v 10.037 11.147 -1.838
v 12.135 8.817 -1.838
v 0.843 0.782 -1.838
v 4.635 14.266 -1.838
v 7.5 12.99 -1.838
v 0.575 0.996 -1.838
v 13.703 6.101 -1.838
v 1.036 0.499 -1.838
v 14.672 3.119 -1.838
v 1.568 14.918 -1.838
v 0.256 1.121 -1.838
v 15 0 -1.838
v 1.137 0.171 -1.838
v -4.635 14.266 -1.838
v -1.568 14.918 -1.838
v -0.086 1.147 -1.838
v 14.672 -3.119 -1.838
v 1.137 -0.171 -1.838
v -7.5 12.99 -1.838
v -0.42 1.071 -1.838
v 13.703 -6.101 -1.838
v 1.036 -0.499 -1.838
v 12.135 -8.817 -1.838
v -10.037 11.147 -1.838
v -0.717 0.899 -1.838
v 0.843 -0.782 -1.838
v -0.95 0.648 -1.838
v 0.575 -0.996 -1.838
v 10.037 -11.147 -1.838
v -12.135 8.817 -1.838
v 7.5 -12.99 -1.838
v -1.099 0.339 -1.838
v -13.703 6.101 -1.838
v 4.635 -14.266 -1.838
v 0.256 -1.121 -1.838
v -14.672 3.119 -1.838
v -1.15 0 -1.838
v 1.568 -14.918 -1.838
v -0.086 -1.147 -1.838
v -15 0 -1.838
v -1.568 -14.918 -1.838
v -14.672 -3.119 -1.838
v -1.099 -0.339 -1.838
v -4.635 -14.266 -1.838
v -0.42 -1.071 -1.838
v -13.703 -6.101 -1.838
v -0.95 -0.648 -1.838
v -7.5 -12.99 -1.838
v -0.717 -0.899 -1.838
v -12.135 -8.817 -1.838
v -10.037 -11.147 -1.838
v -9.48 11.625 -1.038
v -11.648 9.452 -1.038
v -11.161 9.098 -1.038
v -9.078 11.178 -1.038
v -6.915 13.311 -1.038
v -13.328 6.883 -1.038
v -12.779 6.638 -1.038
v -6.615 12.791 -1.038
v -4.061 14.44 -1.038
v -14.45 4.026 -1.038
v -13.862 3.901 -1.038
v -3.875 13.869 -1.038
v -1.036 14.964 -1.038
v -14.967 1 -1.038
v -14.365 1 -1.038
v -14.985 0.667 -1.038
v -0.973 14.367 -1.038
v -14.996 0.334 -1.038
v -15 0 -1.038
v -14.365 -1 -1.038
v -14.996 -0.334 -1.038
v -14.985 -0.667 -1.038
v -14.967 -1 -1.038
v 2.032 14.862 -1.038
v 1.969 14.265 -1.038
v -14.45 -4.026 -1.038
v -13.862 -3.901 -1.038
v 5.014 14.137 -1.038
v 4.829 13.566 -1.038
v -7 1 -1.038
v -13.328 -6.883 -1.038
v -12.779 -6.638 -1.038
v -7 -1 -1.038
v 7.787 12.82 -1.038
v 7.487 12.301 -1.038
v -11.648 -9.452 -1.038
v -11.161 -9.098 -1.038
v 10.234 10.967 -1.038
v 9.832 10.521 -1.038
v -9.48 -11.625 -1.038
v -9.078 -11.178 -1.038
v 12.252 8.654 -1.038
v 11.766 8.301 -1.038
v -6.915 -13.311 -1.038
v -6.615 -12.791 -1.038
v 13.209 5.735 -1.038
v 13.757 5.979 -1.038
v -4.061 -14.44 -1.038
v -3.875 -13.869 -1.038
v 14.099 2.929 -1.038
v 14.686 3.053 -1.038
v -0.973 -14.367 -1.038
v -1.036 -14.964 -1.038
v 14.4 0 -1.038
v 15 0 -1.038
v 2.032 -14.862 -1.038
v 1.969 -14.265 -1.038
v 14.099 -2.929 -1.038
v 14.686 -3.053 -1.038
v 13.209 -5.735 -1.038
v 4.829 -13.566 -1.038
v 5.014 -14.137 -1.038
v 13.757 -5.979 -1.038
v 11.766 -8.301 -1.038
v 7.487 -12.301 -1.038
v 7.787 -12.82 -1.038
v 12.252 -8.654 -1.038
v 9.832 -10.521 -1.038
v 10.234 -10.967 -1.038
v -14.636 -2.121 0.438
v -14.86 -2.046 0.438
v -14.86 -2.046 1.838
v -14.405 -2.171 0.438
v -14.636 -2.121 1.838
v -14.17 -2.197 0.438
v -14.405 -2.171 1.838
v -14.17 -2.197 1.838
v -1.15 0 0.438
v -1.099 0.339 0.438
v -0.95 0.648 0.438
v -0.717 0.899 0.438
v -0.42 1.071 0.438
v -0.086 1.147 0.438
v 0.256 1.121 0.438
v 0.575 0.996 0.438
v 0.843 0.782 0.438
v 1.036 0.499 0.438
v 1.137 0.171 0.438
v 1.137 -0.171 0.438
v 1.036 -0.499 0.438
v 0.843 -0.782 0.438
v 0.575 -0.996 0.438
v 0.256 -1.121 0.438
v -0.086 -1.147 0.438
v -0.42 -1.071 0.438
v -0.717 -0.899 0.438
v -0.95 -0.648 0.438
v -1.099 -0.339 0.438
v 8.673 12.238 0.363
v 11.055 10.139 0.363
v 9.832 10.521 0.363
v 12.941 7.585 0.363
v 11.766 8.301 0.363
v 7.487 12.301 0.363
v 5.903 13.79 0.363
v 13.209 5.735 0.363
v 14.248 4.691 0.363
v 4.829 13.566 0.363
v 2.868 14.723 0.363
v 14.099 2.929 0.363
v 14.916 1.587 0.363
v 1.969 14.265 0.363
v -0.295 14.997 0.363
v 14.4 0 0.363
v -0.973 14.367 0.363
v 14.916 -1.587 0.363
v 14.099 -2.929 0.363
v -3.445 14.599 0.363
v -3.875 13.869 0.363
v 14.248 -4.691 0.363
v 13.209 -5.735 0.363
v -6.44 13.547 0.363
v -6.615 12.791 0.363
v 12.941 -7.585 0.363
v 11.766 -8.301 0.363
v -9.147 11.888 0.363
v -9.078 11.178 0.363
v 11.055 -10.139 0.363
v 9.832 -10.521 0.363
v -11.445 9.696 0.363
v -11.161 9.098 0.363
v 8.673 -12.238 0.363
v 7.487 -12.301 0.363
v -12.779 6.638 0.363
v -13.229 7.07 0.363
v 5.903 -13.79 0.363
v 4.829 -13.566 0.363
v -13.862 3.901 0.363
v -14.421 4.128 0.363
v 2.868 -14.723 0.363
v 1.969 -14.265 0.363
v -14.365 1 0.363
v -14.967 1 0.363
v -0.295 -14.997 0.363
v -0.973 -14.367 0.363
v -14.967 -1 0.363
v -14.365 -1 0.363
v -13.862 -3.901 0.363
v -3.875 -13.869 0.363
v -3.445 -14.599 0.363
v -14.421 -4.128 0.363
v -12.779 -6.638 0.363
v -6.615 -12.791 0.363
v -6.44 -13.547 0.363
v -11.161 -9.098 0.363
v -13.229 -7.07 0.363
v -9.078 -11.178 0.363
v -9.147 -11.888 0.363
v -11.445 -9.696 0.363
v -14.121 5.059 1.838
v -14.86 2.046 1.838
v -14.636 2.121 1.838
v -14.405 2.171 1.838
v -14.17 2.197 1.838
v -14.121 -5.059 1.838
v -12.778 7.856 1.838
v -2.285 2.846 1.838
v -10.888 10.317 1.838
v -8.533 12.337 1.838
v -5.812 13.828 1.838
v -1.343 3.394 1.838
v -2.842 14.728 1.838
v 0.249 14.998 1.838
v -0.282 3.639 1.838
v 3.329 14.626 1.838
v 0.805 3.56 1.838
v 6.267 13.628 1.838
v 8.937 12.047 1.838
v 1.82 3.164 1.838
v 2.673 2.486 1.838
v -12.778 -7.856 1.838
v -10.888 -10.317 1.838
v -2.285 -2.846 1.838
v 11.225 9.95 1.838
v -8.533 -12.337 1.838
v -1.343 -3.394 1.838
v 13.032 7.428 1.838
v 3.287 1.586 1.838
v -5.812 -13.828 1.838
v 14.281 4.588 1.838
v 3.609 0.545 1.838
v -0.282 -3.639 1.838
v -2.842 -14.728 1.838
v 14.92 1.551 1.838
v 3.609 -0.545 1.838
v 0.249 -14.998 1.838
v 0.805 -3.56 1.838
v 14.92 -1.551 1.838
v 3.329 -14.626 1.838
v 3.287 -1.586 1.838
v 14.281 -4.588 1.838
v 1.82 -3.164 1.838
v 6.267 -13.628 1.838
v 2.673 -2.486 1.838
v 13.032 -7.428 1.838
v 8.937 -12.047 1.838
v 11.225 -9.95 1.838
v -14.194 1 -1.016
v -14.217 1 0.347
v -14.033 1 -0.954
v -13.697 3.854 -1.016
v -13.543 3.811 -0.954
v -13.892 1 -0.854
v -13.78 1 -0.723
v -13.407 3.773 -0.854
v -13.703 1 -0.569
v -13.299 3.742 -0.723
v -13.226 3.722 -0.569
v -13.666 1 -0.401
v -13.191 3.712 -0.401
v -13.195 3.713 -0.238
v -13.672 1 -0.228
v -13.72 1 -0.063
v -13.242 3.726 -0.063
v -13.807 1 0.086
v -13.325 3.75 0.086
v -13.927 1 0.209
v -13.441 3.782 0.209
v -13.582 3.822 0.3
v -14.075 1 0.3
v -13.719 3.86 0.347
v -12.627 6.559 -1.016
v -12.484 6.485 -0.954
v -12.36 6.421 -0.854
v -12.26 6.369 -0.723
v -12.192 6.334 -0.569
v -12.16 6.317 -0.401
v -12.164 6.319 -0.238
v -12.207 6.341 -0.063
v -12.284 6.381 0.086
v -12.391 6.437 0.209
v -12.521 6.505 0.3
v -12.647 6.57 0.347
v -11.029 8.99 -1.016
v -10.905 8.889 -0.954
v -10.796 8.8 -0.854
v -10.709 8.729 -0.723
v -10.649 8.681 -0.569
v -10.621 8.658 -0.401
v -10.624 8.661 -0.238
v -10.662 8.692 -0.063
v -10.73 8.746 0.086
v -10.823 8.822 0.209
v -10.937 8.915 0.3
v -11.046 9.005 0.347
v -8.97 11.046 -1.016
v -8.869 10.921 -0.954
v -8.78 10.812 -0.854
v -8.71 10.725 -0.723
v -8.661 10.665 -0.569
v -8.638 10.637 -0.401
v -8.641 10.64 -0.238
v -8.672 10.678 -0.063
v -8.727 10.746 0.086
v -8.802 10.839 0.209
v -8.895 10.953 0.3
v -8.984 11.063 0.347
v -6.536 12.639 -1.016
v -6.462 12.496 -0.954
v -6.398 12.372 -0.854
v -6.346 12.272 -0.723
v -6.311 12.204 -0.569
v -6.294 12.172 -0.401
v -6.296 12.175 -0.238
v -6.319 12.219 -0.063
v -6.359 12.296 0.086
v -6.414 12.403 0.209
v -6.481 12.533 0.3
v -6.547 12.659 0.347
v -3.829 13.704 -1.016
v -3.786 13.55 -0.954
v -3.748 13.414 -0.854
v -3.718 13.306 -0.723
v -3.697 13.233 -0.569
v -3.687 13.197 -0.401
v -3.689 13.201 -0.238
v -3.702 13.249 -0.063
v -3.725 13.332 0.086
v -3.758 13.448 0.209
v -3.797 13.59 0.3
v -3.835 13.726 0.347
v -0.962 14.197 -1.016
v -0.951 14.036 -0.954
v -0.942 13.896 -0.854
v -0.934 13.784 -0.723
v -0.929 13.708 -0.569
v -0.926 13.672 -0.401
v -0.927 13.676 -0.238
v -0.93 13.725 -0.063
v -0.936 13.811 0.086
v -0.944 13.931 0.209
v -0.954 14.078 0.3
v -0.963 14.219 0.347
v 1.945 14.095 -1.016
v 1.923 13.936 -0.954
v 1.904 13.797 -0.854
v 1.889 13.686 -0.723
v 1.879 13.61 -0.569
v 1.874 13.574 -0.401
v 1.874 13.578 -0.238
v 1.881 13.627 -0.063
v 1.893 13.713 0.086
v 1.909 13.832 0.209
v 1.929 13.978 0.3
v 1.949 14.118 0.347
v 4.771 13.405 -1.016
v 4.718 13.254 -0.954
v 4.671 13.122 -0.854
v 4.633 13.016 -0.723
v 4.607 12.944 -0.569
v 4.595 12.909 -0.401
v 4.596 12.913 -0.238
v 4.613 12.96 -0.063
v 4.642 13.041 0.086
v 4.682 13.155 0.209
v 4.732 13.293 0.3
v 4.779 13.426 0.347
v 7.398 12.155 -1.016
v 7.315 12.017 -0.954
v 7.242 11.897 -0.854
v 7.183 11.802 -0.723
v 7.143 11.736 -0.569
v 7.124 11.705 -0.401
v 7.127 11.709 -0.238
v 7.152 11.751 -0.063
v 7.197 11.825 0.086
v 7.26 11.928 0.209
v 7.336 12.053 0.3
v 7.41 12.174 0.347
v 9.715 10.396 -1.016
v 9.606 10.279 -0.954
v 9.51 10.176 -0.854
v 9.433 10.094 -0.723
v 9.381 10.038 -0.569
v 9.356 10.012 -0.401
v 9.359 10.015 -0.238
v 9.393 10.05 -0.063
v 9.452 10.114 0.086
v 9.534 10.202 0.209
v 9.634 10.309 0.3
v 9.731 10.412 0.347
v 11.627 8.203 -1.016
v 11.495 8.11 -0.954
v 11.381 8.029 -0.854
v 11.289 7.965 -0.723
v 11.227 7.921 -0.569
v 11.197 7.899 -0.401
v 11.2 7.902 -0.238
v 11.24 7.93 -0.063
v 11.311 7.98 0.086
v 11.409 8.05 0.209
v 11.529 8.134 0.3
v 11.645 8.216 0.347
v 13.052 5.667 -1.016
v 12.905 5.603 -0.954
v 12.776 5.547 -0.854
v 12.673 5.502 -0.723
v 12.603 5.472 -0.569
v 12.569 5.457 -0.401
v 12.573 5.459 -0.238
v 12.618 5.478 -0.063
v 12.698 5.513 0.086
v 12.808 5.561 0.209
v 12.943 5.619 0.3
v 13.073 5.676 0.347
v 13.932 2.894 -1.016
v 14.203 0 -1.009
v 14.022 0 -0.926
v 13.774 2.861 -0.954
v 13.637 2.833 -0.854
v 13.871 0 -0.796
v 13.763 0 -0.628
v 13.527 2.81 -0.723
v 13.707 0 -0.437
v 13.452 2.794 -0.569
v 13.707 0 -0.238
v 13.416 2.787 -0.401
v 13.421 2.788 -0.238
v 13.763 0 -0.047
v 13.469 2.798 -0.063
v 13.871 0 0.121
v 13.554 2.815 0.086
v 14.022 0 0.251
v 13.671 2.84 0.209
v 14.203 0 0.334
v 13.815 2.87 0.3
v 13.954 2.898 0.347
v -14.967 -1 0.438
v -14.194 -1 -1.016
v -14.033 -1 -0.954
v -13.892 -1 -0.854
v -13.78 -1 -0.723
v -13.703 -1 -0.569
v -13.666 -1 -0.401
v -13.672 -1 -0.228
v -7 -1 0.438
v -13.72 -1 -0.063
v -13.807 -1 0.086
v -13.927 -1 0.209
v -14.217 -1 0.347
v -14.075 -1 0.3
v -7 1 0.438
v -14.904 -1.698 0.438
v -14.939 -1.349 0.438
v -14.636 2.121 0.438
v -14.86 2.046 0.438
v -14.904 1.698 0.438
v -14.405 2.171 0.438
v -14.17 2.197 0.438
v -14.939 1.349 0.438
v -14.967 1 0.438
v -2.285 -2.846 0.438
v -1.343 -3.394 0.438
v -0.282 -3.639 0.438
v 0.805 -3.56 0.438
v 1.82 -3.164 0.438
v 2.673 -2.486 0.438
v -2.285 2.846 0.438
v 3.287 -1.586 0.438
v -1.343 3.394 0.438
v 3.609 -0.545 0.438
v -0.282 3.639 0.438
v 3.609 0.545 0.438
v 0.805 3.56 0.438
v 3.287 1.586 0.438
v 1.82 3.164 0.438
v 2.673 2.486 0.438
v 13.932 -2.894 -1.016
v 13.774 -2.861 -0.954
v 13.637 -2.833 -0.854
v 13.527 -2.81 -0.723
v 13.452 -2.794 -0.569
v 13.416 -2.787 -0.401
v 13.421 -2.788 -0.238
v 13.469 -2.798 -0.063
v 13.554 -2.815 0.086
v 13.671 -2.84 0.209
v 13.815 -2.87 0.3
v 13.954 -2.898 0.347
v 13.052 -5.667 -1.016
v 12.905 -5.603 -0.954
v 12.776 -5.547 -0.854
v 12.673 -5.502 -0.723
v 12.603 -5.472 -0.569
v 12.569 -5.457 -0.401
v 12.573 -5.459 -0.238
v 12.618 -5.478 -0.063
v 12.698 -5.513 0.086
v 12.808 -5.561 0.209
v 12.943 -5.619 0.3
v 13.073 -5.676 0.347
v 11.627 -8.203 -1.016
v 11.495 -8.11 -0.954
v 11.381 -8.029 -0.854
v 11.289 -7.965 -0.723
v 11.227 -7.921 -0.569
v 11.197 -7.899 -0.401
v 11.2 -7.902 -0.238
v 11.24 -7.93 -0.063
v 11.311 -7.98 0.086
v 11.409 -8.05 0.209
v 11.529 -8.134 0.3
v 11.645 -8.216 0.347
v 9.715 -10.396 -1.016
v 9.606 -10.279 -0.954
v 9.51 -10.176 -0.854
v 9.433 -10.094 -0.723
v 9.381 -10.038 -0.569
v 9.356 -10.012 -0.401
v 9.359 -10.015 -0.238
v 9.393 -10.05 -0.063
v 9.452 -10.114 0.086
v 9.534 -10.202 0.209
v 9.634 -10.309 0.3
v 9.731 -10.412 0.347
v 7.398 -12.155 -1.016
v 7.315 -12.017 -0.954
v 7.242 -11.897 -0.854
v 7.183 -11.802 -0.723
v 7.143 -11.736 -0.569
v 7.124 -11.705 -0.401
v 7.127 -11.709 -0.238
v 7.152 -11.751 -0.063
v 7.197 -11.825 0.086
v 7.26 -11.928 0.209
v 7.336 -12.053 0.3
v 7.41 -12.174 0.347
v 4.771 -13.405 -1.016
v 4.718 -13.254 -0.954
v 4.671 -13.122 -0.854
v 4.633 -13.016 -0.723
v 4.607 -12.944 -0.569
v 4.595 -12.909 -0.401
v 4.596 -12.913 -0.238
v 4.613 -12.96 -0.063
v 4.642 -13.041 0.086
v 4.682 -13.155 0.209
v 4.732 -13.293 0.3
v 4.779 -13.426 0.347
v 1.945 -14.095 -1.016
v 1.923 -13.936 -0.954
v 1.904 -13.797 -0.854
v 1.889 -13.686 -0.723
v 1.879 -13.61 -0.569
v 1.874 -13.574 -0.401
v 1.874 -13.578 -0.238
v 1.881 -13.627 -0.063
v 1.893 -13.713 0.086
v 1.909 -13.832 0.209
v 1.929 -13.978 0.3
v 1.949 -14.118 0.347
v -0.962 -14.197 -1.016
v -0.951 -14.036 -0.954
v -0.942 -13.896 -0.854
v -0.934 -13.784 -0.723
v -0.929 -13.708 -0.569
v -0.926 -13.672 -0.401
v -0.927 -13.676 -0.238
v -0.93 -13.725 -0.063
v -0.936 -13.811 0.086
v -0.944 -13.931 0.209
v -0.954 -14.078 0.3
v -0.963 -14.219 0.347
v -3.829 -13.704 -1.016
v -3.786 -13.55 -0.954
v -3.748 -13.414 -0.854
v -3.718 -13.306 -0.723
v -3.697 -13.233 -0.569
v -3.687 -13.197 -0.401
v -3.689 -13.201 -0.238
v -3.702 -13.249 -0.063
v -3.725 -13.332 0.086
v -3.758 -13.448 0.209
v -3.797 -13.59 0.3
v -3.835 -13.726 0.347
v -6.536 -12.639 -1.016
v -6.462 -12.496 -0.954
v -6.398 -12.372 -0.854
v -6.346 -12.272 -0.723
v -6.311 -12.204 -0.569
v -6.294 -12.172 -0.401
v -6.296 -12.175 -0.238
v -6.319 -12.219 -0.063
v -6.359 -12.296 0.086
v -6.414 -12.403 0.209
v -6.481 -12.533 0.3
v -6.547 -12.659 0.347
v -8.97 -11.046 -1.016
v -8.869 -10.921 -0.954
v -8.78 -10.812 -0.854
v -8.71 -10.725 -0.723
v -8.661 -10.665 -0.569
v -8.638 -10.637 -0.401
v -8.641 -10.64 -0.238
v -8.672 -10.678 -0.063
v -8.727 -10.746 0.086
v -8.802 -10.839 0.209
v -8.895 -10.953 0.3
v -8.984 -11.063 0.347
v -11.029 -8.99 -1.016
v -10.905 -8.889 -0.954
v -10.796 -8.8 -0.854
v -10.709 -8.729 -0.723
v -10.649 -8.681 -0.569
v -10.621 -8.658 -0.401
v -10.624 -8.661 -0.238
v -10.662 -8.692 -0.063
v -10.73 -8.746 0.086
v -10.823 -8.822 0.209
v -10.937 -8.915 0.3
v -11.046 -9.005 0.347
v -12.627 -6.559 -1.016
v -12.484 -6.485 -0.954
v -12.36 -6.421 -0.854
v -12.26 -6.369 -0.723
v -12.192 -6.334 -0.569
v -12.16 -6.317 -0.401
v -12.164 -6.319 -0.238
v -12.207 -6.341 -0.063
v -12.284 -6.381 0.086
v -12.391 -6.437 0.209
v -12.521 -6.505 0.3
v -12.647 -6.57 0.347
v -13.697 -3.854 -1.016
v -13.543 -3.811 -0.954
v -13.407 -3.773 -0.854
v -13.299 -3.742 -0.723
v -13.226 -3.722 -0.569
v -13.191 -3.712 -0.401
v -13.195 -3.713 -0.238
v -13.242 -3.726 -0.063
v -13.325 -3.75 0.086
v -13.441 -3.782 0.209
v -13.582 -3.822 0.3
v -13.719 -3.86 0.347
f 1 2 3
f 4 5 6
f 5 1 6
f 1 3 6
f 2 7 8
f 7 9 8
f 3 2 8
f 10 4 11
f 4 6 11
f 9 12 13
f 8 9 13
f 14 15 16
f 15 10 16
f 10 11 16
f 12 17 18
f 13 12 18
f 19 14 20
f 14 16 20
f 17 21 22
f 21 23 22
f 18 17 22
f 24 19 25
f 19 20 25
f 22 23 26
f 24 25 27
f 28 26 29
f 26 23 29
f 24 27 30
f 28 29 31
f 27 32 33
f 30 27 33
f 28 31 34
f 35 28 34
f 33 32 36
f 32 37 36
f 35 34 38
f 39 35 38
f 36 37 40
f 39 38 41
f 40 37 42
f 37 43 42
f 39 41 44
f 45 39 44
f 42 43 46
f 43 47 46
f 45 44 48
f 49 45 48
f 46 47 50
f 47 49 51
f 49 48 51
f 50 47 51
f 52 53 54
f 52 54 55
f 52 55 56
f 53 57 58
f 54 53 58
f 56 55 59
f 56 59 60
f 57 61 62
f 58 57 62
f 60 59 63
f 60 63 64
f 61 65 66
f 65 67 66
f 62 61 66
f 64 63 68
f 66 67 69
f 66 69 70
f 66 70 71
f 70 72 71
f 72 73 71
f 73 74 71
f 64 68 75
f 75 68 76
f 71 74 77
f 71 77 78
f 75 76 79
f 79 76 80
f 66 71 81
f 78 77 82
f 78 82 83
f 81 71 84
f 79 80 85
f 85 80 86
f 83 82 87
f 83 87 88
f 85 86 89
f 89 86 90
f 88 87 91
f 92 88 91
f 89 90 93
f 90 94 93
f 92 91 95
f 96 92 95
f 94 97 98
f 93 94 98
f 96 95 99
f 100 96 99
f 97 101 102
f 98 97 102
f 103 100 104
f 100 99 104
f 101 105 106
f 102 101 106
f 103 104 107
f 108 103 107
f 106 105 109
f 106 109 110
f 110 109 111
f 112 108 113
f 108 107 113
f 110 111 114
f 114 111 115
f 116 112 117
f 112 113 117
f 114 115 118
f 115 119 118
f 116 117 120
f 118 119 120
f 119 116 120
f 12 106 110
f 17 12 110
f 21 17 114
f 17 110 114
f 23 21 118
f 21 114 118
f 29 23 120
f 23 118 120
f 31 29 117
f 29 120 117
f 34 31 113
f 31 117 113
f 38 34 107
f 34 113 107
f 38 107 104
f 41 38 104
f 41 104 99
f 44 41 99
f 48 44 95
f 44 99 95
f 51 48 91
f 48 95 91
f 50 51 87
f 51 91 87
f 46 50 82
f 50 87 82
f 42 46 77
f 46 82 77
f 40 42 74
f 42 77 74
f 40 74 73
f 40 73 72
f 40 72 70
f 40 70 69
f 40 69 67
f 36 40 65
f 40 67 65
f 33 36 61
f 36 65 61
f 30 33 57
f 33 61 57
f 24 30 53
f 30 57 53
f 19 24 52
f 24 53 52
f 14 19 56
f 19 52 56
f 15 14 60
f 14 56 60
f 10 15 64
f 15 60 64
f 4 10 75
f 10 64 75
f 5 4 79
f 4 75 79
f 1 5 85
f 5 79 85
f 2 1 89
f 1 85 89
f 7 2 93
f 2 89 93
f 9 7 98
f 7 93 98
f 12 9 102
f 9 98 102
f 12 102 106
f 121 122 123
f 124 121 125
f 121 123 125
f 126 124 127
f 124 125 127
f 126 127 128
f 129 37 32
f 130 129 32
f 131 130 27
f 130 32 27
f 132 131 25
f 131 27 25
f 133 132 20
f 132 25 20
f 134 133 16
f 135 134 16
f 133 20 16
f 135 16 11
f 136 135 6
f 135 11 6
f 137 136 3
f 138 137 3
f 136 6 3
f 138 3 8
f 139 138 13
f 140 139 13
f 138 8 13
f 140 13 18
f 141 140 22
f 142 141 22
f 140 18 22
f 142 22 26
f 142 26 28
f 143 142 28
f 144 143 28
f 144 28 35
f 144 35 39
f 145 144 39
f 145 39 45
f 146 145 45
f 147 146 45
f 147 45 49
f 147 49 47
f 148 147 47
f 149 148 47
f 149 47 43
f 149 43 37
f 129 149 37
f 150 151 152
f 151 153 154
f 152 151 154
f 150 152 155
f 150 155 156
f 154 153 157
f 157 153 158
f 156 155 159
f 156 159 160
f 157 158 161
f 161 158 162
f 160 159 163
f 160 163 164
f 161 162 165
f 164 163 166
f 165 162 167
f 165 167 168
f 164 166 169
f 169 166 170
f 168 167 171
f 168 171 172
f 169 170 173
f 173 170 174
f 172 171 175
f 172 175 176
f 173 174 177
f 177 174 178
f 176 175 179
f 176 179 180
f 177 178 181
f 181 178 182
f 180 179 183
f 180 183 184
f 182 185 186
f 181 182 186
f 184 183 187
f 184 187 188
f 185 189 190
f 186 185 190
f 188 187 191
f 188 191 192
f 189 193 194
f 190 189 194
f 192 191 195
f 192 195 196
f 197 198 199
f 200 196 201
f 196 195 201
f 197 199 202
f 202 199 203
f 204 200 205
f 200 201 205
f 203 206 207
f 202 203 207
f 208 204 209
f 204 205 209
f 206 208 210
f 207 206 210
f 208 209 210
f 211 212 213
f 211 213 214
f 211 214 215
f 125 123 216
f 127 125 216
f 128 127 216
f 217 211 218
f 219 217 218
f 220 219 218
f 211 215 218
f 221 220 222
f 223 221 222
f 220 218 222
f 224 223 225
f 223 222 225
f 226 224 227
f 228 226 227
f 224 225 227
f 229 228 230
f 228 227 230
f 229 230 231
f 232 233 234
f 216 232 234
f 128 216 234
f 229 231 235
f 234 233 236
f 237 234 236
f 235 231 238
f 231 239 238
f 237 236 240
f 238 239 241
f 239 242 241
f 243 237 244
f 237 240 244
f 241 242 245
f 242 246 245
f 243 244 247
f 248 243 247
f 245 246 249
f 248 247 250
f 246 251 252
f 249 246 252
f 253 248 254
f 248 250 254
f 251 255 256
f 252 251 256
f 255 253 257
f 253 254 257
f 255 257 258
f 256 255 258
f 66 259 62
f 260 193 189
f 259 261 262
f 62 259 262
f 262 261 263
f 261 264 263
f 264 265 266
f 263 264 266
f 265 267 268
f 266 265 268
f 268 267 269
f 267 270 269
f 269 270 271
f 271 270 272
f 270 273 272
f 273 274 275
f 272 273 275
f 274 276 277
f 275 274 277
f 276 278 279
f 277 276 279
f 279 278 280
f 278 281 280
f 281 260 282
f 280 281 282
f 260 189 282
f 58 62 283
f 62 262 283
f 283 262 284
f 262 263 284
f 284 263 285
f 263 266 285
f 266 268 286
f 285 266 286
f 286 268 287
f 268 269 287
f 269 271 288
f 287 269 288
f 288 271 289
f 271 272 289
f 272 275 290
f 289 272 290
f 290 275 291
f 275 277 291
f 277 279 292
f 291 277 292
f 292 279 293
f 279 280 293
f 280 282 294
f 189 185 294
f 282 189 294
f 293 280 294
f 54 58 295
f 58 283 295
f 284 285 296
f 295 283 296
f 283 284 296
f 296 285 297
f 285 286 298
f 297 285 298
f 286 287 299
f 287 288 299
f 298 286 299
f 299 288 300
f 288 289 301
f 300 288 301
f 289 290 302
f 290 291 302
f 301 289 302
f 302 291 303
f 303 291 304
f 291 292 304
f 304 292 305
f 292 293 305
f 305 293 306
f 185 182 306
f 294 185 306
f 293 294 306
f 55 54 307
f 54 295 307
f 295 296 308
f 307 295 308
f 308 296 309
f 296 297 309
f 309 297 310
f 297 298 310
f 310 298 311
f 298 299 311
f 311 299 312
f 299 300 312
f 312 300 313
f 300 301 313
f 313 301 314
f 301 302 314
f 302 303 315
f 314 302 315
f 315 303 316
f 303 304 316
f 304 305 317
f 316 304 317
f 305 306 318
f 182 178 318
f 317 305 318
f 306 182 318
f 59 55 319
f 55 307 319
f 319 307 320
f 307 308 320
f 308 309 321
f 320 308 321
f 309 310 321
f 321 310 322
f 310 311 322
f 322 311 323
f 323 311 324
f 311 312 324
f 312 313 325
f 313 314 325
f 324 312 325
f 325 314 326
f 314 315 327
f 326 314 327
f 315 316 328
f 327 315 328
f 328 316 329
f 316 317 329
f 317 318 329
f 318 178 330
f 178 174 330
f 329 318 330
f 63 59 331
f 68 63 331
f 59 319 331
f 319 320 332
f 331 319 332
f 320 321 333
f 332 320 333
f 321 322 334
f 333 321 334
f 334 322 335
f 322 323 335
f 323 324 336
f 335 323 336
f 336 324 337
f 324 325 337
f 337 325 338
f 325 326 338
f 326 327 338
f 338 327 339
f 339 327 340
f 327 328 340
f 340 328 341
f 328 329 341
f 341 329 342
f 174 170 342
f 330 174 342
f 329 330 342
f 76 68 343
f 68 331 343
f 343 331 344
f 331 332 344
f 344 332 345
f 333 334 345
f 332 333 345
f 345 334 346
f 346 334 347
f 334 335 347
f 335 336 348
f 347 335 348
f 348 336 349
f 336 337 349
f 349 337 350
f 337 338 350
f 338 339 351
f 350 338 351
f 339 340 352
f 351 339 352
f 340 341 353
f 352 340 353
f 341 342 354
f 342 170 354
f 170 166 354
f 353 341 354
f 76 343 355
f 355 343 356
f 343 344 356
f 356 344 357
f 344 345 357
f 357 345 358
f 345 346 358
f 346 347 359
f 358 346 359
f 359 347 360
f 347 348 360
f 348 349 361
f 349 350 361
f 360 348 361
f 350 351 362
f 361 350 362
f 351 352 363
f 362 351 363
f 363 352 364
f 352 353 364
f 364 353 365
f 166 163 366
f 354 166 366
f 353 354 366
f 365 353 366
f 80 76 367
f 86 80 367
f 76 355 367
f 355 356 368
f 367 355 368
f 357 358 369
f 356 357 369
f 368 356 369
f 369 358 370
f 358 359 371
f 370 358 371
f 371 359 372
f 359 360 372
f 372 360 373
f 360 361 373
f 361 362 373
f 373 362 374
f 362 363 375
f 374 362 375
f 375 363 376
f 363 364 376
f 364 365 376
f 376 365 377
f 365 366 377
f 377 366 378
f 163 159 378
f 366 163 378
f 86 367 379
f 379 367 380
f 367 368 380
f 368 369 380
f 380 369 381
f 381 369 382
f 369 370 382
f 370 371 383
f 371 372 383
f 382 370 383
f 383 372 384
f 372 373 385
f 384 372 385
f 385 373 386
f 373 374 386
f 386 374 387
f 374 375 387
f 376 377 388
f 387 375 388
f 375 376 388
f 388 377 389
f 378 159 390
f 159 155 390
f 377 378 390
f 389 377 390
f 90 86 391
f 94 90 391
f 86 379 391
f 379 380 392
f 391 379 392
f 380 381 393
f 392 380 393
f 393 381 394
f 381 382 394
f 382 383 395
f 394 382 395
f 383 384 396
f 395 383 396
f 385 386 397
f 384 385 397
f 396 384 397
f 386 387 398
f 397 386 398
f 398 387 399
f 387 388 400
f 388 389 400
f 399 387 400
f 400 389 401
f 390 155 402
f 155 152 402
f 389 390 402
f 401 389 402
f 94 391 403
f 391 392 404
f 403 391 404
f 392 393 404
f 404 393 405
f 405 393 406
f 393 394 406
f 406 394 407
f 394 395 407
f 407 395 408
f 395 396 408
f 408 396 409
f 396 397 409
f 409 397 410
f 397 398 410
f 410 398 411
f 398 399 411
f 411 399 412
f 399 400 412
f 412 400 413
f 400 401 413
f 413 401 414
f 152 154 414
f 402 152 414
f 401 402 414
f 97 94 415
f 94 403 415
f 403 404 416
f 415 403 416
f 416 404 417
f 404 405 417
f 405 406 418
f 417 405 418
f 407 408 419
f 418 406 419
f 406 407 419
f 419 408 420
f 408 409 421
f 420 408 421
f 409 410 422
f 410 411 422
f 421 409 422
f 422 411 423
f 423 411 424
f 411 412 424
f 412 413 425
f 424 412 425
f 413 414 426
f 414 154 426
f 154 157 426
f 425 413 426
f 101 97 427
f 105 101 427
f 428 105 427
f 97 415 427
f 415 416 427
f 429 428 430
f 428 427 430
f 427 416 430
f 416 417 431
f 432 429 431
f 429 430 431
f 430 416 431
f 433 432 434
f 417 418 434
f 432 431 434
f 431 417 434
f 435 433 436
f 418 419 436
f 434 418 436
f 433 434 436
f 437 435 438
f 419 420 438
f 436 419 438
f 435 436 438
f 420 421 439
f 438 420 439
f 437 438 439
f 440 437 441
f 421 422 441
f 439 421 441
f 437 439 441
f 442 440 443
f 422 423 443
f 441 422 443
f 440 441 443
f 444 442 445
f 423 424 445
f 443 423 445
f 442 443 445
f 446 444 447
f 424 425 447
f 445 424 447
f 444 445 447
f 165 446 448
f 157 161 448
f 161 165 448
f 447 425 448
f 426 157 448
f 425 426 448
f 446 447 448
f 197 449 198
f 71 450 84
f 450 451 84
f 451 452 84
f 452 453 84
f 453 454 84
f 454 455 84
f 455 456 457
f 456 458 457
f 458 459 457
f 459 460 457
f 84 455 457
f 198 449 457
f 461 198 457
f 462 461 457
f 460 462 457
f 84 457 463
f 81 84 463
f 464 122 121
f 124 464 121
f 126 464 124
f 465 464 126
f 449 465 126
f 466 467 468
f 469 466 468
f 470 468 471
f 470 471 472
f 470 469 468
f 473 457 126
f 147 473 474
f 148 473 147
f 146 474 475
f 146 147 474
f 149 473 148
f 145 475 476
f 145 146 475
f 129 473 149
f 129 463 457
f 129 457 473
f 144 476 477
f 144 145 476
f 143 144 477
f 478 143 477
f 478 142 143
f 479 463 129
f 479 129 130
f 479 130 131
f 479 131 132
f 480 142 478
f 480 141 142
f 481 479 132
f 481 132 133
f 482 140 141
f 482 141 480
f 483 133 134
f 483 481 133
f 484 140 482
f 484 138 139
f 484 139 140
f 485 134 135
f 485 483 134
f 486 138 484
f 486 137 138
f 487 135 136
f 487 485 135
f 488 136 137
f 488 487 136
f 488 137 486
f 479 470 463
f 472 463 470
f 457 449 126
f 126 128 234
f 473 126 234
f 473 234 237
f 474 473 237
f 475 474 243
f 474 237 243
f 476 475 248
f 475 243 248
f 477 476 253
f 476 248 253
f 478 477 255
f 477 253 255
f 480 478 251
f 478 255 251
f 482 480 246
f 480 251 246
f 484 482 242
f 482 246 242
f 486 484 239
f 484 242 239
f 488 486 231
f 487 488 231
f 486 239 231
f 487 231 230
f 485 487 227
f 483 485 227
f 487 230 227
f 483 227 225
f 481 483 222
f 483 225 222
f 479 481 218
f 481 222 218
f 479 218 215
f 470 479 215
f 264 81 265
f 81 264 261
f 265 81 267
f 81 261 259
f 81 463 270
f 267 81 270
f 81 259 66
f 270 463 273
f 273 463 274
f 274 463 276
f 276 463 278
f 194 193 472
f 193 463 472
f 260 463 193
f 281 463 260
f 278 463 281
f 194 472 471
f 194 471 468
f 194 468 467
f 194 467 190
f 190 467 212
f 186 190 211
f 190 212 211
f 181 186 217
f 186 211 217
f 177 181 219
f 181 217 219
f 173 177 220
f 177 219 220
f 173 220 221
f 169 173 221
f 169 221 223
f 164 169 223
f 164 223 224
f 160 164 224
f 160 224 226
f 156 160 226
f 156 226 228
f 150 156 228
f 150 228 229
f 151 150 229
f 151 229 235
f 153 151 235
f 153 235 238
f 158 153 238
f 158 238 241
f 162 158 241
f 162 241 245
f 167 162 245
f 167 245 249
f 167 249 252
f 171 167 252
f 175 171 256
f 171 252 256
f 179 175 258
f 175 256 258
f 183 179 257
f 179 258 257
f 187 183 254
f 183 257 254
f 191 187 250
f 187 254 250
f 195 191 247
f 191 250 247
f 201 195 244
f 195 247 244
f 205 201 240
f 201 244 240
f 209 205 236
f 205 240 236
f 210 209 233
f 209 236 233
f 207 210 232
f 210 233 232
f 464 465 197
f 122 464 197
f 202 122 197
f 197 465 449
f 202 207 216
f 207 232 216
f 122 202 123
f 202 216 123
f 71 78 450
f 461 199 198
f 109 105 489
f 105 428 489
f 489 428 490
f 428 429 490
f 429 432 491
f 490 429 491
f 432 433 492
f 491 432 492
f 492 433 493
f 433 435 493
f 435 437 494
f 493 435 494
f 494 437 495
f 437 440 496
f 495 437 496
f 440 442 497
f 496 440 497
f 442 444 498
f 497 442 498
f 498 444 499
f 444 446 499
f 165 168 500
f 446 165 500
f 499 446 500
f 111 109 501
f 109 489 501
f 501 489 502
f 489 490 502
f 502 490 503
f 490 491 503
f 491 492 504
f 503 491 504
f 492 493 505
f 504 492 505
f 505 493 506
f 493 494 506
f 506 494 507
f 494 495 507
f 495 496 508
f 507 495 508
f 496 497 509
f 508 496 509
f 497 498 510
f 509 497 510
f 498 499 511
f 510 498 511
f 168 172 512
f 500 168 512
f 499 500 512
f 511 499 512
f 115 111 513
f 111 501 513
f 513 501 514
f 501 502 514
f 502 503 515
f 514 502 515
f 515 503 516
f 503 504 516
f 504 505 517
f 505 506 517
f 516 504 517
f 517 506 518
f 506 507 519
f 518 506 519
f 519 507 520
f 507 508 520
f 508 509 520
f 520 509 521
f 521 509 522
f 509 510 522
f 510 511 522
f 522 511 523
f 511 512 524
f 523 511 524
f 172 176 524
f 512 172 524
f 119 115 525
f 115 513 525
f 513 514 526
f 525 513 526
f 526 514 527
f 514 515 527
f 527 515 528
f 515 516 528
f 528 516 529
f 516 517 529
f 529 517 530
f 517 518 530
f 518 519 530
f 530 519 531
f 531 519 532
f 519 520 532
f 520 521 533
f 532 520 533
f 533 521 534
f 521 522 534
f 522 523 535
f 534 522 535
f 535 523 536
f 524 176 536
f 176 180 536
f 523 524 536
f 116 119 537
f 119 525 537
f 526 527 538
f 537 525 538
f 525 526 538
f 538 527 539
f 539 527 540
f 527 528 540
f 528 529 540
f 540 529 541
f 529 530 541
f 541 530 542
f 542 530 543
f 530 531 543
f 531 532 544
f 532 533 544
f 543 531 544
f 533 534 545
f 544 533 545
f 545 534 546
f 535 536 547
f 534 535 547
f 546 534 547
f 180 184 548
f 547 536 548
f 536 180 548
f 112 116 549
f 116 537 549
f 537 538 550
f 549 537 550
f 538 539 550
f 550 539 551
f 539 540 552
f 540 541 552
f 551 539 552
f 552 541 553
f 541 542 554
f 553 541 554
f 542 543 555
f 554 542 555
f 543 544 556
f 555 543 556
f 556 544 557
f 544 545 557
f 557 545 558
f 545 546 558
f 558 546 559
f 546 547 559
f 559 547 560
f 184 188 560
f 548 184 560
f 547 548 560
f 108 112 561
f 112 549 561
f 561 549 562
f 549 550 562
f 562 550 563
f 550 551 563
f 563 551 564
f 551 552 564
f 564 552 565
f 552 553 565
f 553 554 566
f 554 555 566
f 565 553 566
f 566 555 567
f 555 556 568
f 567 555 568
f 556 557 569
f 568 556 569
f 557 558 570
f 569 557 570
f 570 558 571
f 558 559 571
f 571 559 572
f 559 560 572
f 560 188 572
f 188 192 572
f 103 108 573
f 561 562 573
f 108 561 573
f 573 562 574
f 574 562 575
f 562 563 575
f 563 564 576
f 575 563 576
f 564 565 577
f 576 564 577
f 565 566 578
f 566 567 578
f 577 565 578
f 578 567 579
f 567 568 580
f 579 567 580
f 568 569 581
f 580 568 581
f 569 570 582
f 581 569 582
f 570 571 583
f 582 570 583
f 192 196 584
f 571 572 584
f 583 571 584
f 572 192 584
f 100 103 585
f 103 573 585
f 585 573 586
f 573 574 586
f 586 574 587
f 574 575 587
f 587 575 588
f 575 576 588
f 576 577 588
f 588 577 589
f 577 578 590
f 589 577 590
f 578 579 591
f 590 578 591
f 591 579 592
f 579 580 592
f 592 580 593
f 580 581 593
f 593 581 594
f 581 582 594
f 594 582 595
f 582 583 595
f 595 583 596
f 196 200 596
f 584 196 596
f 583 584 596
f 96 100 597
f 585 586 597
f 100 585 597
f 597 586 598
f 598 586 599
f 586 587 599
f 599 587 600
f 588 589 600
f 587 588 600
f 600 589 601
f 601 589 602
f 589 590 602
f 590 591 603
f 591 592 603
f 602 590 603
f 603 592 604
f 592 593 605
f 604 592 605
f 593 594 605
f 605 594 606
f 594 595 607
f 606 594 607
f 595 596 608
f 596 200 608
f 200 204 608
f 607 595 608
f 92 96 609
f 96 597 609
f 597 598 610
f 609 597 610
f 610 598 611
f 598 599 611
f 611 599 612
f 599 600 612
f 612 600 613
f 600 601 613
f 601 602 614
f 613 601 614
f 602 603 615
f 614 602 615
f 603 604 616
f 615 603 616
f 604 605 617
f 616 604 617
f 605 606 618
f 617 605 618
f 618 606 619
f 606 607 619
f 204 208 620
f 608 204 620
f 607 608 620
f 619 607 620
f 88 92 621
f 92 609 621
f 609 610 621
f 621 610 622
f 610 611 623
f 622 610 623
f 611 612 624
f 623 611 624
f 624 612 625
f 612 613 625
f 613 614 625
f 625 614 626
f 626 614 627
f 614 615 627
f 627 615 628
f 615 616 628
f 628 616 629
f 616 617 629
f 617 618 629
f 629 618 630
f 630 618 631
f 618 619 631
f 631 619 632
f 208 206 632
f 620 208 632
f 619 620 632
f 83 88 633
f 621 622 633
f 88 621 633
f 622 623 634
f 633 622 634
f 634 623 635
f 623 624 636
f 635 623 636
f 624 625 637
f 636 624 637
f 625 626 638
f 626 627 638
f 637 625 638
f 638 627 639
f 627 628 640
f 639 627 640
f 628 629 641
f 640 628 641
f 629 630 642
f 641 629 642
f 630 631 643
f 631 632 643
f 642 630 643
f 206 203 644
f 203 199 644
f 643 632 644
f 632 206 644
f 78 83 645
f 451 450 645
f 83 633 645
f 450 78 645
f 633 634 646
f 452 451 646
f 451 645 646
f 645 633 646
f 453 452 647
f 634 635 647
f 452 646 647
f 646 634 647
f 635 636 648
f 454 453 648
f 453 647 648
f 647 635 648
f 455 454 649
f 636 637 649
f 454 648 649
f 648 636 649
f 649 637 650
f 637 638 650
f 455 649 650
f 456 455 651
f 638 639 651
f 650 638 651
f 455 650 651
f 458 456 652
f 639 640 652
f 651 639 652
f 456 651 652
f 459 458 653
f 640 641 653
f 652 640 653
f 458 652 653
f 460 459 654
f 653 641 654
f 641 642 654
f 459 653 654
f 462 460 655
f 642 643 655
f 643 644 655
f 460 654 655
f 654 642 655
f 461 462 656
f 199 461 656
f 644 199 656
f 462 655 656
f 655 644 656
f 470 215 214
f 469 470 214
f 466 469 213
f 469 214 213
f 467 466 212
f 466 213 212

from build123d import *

# Parameters (mm, degrees)
CUT_EXTRUDE1_DEPTH = 1.4
SKETCH5_R          = 1.15
CUT_EXTRUDE2_DEPTH = 22.529180779
CUT_EXTRUDE3_DEPTH = 1.475


with BuildPart() as part:
    # Sketch1 → Revolve1 (revolve)
    with BuildSketch(Plane(origin=(0, 0, 0), x_dir=(0, 0, -1), z_dir=(1, 0, 0)), mode=Mode.PRIVATE) as revolve1_sk:
        with BuildLine():
            Line((-1.8375, 0), (1.8375, 0))
            Line((1.8375, 0), (1.8375, 15))
            Line((1.8375, 15), (1.0375, 15))
            Line((1.0375, 15), (1.0375, 14.4))
            ThreePointArc((1.0375, 14.4), (0.3375, 13.7), (-0.3625, 14.4))
            Line((-0.3625, 14.4), (-0.3625, 15))
            Line((-0.3625, 15), (-1.8375, 15))
            Line((-1.8375, 15), (-1.8375, 0))
        make_face()
    revolve(revolve1_sk.sketch.rotate(Axis((0, 0, 1.8375), (0, 0, -1)), 90), axis=Axis((0, 0, 1.8375), (0, 0, -1)))

    # Sketch2 → Cut-Extrude1 (cut)
    with BuildSketch(Plane.XY.offset(1.8375)):
        with BuildLine():
            Line((-2.285166262, 2.846140396), (-14.170034164, 2.196722968))
            ThreePointArc((-14.170034164, 2.196722968), (-16.25, 0), (-14.170034164, -2.196722968))
            Line((-14.170034164, -2.196722968), (-2.285166262, -2.846140396))
            ThreePointArc((-2.285166262, -2.846140396), (3.65, 0), (-2.285166262, 2.846140396))
        make_face()
    extrude(amount=-CUT_EXTRUDE1_DEPTH, mode=Mode.SUBTRACT)

    # Sketch5 → Cut-Extrude2 (cut, through all)
    with BuildSketch(Plane(origin=(0, 0, -1.8375), x_dir=(-1, 0, 0), z_dir=(0, 0, -1))):
        Circle(SKETCH5_R)
    extrude(amount=-CUT_EXTRUDE2_DEPTH, mode=Mode.SUBTRACT)

    # Sketch6 → Cut-Extrude3 (cut)
    with BuildSketch(Plane.XY.offset(0.4375)):
        with BuildLine():
            Line((-14.966629547, -1), (-7, -1))
            Line((-7, -1), (-7, 1))
            Line((-7, 1), (-14.966629547, 1))
            ThreePointArc((-14.966629547, 1), (-14.991655066, 0.500278293), (-15, -5.3e-08))
            ThreePointArc((-15, -5.3e-08), (-14.991655065, -0.500278346), (-14.966629547, -1))
        make_face()
    extrude(amount=-CUT_EXTRUDE3_DEPTH, mode=Mode.SUBTRACT)


solid = part.part
